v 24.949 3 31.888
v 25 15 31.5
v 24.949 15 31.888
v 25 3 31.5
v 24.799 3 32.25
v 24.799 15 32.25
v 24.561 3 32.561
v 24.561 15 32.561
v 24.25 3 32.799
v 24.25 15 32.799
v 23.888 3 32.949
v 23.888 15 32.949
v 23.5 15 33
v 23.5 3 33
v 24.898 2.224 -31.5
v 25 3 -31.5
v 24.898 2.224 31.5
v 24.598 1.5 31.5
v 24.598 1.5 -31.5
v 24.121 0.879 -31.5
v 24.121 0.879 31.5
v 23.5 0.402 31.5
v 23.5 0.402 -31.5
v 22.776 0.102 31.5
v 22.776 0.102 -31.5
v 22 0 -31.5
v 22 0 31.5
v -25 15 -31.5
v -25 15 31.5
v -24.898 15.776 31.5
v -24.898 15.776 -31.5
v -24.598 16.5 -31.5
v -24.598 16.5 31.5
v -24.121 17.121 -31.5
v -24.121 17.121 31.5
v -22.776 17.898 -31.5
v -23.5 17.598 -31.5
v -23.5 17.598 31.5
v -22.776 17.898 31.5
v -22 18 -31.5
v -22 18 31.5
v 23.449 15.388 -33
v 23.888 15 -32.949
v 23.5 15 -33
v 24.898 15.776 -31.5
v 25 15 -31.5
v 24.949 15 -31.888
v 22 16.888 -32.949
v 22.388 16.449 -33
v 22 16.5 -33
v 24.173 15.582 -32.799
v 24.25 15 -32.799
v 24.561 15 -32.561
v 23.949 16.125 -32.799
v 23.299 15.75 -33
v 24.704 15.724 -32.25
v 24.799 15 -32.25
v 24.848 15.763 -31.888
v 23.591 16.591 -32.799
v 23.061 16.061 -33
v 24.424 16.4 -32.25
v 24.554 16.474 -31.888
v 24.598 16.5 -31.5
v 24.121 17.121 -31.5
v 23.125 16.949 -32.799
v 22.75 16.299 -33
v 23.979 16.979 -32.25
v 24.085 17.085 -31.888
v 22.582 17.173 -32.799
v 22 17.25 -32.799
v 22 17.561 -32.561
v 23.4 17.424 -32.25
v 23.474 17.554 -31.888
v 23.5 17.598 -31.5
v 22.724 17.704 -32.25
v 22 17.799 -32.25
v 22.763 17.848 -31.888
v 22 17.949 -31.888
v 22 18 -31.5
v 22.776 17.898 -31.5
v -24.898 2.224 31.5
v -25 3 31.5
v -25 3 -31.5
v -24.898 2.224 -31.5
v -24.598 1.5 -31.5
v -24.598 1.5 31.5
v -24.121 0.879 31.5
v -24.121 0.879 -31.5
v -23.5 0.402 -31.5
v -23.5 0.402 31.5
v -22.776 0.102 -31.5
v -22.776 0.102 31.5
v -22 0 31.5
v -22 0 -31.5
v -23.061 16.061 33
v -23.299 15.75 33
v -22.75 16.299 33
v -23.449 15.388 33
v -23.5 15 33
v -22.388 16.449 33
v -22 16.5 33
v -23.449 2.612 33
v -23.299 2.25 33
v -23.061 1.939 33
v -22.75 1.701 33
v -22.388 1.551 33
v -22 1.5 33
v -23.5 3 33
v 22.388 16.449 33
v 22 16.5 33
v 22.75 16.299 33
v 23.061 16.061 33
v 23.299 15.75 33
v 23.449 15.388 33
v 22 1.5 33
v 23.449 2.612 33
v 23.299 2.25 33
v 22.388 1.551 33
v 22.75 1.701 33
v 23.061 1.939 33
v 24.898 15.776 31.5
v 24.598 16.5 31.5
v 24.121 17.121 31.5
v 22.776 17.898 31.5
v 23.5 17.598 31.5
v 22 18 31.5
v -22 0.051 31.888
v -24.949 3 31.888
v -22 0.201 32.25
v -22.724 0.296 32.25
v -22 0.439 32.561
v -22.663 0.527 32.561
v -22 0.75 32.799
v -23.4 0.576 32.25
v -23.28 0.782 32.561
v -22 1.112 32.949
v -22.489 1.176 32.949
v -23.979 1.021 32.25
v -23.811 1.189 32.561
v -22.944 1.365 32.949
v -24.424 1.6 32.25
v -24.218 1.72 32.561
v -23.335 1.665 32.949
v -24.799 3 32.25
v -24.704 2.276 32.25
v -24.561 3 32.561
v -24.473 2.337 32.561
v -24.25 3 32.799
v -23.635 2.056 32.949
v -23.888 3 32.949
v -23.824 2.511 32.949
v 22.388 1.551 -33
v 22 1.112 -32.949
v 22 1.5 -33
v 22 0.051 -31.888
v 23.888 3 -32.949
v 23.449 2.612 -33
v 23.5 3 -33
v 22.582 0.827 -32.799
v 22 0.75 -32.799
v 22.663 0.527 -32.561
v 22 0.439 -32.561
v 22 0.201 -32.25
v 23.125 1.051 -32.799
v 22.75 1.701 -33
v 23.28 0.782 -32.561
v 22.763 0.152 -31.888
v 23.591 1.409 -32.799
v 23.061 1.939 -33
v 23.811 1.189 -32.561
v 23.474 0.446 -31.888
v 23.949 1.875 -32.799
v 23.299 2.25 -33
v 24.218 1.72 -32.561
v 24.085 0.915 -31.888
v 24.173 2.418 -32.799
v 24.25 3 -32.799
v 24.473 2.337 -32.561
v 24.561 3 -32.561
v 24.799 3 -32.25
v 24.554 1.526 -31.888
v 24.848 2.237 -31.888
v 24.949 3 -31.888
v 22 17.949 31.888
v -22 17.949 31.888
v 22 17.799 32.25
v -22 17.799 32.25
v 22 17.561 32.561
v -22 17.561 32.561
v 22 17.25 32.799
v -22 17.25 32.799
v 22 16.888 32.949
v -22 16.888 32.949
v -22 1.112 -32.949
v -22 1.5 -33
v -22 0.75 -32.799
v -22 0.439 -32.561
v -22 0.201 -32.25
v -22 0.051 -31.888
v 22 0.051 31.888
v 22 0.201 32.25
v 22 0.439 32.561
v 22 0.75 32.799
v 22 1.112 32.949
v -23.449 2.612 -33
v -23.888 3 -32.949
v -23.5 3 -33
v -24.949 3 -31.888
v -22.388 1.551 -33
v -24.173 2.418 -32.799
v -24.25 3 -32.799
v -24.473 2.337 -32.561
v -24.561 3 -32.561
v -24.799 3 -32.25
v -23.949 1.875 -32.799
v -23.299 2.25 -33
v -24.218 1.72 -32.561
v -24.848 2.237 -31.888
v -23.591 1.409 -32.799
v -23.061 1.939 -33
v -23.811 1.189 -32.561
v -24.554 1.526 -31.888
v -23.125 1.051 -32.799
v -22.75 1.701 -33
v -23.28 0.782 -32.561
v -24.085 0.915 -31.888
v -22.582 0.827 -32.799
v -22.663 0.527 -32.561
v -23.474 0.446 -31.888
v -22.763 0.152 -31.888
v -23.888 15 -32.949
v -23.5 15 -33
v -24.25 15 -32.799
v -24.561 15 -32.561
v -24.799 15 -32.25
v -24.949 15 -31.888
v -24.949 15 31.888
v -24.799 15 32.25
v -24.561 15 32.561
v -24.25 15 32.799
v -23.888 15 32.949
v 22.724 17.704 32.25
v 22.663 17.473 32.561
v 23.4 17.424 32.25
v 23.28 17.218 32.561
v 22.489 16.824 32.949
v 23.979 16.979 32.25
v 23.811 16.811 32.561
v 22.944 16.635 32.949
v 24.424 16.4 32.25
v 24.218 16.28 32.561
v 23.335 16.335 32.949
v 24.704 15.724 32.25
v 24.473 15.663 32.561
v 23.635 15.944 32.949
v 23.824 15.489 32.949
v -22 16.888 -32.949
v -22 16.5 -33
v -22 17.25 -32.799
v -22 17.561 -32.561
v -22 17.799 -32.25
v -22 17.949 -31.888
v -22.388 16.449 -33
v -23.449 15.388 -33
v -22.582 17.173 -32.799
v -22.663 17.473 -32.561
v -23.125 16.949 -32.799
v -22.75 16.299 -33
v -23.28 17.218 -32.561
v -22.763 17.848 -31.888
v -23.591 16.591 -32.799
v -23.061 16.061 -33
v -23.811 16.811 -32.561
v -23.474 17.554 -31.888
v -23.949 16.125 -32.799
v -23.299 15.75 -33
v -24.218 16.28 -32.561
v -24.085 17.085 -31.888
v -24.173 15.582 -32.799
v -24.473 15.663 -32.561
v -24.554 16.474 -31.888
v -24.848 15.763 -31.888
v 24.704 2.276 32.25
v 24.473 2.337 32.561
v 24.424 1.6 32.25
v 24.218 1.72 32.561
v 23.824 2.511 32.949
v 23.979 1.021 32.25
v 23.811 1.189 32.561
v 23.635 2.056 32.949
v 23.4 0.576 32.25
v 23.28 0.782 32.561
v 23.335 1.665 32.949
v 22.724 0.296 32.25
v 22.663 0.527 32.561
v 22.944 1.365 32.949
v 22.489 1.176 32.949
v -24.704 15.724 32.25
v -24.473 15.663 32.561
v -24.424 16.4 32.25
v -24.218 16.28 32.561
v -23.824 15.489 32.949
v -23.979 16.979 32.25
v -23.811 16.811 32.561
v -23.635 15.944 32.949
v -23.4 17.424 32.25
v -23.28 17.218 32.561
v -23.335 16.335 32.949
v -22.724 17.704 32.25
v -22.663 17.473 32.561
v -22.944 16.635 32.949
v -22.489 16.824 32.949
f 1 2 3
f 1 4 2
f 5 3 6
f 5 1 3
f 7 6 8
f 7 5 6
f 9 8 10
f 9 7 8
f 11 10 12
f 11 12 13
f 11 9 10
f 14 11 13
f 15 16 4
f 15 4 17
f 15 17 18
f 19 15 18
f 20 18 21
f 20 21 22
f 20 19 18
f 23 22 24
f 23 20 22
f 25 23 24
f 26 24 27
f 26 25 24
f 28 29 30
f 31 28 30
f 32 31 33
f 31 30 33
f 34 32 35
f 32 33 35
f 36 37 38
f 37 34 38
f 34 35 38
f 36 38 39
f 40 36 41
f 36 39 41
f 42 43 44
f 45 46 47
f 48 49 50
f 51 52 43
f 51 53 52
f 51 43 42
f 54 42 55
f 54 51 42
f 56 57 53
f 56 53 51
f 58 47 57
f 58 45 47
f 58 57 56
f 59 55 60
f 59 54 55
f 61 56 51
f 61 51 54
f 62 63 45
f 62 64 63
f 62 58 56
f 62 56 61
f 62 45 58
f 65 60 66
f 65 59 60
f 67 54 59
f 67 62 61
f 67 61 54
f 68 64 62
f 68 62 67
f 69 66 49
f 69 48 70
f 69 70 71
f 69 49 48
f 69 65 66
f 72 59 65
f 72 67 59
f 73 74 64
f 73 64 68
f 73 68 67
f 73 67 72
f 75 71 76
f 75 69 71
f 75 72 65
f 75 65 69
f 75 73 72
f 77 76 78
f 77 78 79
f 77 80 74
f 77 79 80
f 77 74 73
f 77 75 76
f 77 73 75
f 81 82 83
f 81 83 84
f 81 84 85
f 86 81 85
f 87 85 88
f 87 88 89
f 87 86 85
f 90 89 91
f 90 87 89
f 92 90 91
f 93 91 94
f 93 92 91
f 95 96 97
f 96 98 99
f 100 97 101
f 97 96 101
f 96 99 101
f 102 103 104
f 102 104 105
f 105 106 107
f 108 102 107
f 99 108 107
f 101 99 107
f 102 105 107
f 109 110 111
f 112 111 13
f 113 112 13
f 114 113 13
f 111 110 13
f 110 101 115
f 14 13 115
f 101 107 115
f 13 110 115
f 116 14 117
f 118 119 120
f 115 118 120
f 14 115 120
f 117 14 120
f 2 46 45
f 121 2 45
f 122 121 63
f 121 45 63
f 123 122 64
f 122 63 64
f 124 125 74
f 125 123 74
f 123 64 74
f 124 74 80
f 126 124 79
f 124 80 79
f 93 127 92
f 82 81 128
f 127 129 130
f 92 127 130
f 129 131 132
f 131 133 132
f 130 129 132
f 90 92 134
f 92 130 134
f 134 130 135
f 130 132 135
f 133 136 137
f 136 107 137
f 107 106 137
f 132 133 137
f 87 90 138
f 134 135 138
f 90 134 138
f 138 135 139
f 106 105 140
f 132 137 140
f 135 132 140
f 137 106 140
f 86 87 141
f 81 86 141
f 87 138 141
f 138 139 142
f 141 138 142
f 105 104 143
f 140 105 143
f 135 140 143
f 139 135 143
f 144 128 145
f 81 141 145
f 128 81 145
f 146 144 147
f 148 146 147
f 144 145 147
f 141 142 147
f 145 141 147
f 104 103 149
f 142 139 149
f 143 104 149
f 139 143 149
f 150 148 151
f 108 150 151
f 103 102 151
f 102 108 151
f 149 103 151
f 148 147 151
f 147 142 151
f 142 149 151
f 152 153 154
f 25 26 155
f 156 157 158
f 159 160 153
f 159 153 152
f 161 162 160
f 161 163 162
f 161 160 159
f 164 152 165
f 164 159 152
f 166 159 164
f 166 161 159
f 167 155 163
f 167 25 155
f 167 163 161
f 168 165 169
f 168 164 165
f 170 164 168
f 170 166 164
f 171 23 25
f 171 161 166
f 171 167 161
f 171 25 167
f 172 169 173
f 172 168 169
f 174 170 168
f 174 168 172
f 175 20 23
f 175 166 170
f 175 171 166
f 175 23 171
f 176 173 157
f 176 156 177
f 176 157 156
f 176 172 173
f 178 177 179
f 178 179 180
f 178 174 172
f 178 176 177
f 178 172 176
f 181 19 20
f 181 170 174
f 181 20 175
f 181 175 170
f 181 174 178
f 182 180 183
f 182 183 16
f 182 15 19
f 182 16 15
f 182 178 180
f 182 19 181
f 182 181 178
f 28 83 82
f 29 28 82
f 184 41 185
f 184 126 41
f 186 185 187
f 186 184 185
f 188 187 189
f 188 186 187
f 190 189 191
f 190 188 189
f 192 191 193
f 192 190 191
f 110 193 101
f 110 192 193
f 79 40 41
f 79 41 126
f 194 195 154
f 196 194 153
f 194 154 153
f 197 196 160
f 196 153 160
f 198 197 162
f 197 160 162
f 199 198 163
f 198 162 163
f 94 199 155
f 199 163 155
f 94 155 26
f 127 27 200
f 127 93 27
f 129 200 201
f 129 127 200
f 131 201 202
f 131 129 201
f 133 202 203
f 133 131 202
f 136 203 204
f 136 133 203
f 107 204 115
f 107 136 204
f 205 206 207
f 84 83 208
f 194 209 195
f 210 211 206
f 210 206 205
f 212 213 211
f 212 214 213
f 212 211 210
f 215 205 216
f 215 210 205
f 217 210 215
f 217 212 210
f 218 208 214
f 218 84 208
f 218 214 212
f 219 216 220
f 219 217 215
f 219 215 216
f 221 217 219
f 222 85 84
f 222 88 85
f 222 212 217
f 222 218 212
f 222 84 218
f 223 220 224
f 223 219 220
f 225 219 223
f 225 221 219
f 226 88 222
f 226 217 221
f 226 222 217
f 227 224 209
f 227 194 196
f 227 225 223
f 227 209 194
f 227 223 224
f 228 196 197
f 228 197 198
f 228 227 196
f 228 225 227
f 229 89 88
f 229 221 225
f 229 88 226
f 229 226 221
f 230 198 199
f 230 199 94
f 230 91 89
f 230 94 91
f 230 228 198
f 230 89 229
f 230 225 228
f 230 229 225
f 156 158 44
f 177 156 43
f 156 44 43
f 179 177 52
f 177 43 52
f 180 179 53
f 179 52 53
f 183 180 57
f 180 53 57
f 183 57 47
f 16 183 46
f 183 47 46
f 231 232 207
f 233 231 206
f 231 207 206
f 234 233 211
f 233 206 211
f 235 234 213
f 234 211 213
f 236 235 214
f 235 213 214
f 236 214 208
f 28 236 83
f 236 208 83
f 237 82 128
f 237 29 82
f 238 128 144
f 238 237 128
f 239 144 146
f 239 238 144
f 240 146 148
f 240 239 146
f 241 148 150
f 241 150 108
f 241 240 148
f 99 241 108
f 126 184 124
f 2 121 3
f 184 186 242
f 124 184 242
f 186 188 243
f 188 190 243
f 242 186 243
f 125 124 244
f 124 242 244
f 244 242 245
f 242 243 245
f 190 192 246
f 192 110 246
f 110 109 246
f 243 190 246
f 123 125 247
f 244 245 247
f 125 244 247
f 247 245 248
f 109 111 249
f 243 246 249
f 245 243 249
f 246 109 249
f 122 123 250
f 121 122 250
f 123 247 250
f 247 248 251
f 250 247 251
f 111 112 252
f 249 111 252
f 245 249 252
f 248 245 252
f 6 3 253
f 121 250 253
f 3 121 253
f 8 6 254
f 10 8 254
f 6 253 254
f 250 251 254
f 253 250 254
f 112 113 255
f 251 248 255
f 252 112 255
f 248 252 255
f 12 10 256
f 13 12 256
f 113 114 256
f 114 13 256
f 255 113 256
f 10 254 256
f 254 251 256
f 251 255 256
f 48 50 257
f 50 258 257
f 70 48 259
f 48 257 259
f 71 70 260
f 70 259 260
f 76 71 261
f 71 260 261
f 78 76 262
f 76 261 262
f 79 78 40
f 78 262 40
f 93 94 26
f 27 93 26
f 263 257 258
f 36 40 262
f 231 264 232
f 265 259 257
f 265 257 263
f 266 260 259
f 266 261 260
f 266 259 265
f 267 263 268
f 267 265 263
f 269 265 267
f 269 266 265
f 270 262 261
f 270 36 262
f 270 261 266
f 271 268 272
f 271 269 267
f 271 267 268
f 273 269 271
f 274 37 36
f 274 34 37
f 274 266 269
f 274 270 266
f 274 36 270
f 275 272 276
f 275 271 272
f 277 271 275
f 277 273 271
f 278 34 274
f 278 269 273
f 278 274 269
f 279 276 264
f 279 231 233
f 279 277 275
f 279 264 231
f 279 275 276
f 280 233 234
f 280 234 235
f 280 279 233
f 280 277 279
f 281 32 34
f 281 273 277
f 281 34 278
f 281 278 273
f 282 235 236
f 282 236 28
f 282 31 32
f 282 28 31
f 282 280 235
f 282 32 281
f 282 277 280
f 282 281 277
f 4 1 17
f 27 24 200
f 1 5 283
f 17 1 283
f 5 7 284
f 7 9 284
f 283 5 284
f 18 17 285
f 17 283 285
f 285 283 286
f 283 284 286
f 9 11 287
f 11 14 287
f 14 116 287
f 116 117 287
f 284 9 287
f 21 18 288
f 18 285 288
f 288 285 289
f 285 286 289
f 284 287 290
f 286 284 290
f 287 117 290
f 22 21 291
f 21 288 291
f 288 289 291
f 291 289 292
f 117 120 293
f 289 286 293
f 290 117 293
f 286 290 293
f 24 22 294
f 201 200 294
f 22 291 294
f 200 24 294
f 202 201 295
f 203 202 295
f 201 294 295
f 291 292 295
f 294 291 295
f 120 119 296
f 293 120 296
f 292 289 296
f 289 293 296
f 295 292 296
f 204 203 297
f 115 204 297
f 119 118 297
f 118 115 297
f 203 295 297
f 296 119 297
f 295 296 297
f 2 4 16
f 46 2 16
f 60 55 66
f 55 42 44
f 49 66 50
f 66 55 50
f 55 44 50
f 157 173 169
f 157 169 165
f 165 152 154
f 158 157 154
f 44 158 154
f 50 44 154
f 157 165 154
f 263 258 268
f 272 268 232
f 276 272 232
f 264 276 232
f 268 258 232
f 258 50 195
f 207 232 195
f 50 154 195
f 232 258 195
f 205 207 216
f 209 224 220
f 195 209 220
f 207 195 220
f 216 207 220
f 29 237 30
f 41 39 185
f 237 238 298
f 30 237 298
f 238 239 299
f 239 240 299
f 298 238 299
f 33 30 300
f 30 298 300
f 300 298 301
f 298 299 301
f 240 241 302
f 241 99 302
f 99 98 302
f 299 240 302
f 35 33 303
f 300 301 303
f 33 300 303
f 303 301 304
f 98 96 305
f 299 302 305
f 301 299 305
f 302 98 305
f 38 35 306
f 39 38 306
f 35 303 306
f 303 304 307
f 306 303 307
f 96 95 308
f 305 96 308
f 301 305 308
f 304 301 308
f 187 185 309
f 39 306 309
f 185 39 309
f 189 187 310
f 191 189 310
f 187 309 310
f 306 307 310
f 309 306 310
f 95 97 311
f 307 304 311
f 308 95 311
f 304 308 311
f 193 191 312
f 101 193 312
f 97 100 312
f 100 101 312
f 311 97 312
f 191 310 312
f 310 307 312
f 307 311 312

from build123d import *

# Parameters (mm, degrees)
BOSS_EXTRUDE1_DEPTH = 18
FILLET1_R           = 3
FILLET2_R           = 1.5


with BuildPart() as part:
    # Sketch1 → Boss-Extrude1 (new body)
    with BuildSketch(Plane(origin=(0, 0, 0), x_dir=(1, 0, 0), z_dir=(0, 1, 0))):
        Polygon((25, 0), (25, 33), (-25, 33), (-25, -33), (25, -33), align=None)
    extrude(amount=BOSS_EXTRUDE1_DEPTH)

    # Fillet1
    fillet1_edges = [part.edges().sort_by_distance(p)[0] for p in [
        (-25, 18, 0),
        (25, 18, 0),
        (-25, 0, 0),
        (25, 0, 0),
    ]]
    fillet(fillet1_edges, radius=FILLET1_R)

    # Fillet2
    fillet2_edges = [part.edges().sort_by_distance(p)[0] for p in [
        (0, 18, -33),
        (0, 18, 33),
        (0, 0, -33),
        (-25, 9, -33),
        (25, 9, -33),
        (24.121320344, 0.878679656, -33),
        (-24.121320344, 0.878679656, -33),
        (-24.121320344, 17.121320344, -33),
        (24.121320344, 17.121320344, -33),
        (25, 9, 33),
        (0, 0, 33),
        (-25, 9, 33),
        (24.121320344, 0.878679656, 33),
        (-24.121320344, 0.878679656, 33),
        (-24.121320344, 17.121320344, 33),
        (24.121320344, 17.121320344, 33),
    ]]
    fillet(fillet2_edges, radius=FILLET2_R)


solid = part.part
